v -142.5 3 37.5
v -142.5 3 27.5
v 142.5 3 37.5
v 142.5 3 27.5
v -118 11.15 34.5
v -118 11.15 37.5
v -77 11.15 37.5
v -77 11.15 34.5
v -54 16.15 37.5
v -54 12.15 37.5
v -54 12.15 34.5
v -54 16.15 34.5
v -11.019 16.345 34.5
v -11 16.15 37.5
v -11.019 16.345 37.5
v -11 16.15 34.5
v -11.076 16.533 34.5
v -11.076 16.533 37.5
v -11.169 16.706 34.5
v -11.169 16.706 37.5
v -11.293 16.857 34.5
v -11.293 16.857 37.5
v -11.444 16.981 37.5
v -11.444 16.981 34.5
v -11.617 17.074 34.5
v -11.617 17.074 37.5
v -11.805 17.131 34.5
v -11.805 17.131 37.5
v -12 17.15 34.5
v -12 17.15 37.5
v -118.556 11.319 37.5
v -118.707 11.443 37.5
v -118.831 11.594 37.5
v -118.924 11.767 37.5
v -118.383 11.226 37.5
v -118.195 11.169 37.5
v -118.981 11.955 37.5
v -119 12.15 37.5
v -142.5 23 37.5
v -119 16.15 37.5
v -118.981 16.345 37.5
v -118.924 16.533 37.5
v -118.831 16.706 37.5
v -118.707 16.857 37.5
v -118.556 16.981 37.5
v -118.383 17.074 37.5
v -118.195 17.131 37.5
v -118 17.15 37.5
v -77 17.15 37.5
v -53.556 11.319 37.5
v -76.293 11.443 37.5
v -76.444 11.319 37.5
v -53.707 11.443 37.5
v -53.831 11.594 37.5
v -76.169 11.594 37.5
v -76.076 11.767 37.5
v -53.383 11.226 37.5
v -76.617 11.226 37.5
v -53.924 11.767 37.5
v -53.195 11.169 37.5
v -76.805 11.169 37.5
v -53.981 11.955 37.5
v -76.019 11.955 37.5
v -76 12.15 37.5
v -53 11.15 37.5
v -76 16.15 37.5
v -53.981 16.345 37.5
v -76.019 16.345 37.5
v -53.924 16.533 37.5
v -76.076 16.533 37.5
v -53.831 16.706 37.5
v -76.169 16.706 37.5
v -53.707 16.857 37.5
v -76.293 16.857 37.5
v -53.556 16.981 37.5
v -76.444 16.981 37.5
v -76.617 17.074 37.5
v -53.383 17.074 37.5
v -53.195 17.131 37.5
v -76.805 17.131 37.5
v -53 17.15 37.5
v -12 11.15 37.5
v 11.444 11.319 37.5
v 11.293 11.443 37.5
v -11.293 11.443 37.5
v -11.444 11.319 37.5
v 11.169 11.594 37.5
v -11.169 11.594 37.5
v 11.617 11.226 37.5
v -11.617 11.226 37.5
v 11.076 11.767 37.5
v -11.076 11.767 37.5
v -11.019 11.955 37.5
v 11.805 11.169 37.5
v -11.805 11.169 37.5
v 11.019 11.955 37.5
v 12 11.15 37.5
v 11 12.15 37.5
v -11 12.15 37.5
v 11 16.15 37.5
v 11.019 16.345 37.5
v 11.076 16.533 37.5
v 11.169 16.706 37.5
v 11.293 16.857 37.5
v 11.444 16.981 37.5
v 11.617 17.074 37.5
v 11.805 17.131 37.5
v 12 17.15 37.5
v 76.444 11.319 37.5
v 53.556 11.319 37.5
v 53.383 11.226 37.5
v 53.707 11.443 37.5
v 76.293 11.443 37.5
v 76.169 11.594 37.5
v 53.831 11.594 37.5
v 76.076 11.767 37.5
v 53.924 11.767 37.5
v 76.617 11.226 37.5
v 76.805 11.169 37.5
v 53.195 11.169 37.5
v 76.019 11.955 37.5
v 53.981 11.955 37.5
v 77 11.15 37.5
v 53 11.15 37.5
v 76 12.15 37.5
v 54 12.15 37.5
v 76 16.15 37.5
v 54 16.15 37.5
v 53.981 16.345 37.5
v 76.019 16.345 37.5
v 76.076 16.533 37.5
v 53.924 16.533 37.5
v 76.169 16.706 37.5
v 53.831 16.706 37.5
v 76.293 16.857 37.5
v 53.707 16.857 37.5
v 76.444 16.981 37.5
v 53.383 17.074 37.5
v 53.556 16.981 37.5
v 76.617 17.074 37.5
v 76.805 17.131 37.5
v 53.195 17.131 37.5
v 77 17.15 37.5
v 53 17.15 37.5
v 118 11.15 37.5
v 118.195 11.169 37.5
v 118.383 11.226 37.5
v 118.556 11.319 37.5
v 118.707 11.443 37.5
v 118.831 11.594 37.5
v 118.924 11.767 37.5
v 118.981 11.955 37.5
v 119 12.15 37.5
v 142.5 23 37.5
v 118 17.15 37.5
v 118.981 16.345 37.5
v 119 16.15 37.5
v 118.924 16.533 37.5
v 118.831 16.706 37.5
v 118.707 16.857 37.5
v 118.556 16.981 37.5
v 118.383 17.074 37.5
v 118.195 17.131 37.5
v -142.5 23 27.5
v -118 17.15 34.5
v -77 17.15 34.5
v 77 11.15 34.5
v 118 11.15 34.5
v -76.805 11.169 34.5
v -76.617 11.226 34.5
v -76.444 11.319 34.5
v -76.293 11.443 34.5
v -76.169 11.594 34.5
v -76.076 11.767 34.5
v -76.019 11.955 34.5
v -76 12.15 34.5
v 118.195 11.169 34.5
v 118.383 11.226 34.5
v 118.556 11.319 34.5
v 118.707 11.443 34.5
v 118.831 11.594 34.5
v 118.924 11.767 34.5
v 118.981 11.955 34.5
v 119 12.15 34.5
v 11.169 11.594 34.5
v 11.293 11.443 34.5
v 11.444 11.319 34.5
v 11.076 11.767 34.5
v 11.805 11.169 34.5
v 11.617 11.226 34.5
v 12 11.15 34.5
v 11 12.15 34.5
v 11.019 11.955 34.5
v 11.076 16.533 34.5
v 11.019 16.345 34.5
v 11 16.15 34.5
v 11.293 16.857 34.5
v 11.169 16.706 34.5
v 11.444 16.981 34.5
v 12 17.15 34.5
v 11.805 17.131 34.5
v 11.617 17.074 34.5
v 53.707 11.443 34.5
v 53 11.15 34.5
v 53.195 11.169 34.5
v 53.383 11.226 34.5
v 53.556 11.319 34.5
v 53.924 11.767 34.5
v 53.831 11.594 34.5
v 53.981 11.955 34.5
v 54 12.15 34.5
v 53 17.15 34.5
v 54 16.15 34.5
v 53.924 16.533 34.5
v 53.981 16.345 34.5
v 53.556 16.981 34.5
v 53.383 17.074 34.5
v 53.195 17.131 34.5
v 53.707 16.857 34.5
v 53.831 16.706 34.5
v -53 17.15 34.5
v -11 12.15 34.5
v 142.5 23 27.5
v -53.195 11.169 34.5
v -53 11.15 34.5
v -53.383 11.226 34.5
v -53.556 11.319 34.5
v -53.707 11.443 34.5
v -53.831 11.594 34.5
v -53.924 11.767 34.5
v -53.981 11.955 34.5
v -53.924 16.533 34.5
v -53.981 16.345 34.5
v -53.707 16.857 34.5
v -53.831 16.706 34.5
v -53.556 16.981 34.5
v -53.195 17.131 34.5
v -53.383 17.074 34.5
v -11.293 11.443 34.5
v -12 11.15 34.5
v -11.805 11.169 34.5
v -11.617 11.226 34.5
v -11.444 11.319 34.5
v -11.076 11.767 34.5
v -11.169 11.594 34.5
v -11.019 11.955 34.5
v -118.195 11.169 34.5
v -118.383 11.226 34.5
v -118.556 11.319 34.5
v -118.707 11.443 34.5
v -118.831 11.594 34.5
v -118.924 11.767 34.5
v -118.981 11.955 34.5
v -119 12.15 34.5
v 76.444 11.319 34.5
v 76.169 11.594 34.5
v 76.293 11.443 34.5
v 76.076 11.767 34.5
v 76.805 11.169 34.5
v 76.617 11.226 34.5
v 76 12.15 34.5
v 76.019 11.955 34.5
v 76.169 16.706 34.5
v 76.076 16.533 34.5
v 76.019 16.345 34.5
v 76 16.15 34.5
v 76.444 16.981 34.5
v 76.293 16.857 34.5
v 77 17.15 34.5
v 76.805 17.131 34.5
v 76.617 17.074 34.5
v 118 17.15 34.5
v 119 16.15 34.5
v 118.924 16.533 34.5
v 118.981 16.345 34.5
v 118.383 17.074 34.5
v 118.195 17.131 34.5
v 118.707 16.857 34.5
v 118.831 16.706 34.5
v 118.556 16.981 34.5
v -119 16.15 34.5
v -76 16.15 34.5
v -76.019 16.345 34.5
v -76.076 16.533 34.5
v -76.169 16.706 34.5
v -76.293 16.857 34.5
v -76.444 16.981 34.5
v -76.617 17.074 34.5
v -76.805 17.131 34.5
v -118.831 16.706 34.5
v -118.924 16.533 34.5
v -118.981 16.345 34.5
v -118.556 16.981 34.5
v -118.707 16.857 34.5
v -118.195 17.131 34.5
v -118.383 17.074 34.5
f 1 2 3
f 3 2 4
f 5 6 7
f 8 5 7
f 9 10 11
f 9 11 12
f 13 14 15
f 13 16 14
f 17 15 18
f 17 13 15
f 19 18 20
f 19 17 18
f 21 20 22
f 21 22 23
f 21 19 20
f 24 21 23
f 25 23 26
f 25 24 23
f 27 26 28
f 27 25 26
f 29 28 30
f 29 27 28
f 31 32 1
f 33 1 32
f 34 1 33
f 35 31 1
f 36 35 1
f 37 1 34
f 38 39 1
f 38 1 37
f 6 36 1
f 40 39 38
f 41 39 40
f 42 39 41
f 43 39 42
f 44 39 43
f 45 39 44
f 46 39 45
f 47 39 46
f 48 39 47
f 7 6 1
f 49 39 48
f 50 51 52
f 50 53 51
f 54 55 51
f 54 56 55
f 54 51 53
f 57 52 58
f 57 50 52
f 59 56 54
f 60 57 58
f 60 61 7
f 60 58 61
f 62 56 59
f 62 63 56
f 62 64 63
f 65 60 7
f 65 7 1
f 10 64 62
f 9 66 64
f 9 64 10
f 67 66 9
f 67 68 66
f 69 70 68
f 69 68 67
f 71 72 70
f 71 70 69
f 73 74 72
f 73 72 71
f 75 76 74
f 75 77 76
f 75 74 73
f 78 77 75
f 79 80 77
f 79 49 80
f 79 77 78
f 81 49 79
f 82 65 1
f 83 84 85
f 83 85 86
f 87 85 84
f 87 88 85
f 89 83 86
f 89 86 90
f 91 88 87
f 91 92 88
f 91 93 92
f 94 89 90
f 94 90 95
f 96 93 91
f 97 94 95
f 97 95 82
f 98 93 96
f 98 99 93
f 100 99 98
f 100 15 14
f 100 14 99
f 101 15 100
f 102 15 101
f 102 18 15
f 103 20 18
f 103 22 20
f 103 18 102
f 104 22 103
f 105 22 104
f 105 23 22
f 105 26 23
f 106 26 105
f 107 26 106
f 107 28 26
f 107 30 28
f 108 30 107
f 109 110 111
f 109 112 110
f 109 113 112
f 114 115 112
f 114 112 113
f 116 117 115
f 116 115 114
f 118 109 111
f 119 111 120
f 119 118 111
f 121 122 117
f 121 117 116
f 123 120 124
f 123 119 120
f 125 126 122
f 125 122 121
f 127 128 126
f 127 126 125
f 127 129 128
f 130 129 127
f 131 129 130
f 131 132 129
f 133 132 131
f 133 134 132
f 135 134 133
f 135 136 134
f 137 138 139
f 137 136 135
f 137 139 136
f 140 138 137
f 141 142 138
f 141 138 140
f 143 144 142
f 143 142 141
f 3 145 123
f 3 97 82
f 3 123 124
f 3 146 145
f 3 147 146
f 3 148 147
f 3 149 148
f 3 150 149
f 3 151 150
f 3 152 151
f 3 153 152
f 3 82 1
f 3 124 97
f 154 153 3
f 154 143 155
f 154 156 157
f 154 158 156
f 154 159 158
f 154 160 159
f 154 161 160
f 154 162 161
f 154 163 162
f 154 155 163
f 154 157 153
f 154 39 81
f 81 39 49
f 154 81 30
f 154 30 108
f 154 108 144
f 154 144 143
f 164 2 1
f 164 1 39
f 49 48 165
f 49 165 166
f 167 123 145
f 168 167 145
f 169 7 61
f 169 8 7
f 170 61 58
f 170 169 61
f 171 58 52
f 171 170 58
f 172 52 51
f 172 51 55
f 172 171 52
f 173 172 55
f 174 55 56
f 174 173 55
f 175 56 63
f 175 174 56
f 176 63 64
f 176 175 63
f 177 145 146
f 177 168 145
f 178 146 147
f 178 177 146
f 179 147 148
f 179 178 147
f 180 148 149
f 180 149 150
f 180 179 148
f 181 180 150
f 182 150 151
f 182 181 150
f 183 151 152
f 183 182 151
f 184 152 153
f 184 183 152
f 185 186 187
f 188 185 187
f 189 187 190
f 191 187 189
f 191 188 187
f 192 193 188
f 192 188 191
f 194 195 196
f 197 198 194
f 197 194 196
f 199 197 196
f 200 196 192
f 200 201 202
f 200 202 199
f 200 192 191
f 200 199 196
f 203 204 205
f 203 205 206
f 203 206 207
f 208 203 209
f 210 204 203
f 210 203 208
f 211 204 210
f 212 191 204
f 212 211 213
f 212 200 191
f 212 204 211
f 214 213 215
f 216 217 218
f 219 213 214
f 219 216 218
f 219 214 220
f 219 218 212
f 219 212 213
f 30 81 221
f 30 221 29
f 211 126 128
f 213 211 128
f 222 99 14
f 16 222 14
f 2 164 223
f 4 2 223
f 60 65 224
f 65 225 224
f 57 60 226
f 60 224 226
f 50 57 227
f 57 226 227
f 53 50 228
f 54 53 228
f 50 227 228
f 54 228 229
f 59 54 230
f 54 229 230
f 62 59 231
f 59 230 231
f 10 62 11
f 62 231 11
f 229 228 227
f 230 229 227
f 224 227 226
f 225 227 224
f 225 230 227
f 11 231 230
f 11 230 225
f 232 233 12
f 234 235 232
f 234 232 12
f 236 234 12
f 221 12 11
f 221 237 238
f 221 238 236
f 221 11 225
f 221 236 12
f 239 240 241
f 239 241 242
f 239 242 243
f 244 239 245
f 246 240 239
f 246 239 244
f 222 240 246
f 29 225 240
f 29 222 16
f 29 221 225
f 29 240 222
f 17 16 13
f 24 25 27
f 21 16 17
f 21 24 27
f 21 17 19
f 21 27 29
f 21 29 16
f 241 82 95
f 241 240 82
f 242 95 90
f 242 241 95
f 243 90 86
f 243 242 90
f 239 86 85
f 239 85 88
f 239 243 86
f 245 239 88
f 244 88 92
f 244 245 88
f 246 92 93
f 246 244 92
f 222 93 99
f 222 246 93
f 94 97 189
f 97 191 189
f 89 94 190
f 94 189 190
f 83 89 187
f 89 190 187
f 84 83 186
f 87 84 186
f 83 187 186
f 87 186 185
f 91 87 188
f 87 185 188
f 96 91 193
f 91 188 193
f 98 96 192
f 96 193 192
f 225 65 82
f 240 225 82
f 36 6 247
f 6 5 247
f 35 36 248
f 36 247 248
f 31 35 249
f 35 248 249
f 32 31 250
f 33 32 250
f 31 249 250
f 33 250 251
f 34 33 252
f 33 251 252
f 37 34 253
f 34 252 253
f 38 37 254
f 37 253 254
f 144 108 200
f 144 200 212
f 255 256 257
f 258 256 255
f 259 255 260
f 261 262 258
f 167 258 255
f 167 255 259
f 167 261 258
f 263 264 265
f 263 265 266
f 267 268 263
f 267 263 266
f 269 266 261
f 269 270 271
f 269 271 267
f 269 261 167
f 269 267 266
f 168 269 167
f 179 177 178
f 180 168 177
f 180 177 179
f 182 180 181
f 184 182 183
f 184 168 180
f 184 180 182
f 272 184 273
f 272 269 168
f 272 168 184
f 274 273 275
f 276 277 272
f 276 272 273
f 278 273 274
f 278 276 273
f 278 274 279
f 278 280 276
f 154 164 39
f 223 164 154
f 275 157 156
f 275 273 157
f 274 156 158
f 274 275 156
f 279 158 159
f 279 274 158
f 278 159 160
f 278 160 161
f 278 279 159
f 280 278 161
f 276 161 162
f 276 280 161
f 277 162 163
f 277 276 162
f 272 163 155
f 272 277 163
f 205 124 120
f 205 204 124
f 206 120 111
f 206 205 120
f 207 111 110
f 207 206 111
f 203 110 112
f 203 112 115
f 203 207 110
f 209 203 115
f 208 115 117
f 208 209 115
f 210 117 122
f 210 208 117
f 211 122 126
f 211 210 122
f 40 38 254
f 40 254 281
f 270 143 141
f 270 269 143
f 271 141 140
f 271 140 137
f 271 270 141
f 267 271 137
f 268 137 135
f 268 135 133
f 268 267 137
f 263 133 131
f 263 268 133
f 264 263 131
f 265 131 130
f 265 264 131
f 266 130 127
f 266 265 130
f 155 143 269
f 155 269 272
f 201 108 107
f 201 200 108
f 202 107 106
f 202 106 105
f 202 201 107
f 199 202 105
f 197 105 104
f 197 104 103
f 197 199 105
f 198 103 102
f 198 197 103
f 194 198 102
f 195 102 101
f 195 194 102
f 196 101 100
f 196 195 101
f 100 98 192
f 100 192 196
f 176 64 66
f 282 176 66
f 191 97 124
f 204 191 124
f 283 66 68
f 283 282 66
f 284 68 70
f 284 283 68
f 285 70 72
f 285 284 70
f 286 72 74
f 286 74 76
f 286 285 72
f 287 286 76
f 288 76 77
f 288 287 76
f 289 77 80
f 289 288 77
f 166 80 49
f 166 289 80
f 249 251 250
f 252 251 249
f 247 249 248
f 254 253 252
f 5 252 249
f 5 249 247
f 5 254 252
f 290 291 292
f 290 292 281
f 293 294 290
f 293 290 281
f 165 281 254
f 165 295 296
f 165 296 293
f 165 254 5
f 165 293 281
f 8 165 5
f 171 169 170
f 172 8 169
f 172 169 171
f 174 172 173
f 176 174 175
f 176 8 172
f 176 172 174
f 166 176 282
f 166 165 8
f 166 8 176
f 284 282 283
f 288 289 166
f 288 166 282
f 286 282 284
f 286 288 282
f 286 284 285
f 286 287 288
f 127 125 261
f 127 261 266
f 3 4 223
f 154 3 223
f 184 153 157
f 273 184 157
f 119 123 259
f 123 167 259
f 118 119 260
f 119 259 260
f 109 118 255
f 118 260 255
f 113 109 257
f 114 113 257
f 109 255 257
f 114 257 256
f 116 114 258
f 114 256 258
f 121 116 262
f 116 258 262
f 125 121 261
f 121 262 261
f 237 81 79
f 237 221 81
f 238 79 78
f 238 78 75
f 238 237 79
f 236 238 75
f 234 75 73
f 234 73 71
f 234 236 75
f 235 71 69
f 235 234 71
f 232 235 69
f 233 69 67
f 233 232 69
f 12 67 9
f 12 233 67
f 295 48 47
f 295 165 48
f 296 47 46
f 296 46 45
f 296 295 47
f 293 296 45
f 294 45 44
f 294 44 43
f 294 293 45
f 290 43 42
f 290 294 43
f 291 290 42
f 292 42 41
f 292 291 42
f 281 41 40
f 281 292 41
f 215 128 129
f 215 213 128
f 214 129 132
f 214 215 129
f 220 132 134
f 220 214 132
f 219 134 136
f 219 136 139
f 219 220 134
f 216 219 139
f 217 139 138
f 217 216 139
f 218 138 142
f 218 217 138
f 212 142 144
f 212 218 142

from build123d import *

# Parameters (mm, degrees)
SKETCH1_W           = 285
SKETCH1_H           = 20
BOSS_EXTRUDE1_DEPTH = 10
SKETCH5_W           = 43
SKETCH5_H           = 6
CUT_EXTRUDE1_DEPTH  = 3
FILLET1_R           = 1


with BuildPart() as part:
    # Sketch1 → Boss-Extrude1 (new body)
    with BuildSketch(Plane.XY.offset(27.5)):
        with Locations((0, 13)):
            Rectangle(SKETCH1_W, SKETCH1_H)
    extrude(amount=BOSS_EXTRUDE1_DEPTH)

    # Sketch5 → Cut-Extrude1 (cut)
    with BuildSketch(Plane.XY.offset(37.5)):
        with Locations((-97.5, 14.15)):
            Rectangle(SKETCH5_W, SKETCH5_H)
        with Locations((-32.5, 14.15)):
            Rectangle(SKETCH5_W, SKETCH5_H)
        with Locations((32.5, 14.15)):
            Rectangle(SKETCH5_W, SKETCH5_H)
        with Locations((97.5, 14.15)):
            Rectangle(SKETCH5_W, SKETCH5_H)
    extrude(amount=-CUT_EXTRUDE1_DEPTH, mode=Mode.SUBTRACT)

    # Fillet1
    fillet1_edges = [part.edges().sort_by_distance(p)[0] for p in [
        (-76, 17.15, 36),
        (-76, 11.15, 36),
        (-119, 11.15, 36),
        (-119, 17.15, 36),
        (-11, 17.15, 36),
        (-11, 11.15, 36),
        (-54, 11.15, 36),
        (-54, 17.15, 36),
        (54, 17.15, 36),
        (54, 11.15, 36),
        (11, 11.15, 36),
        (11, 17.15, 36),
        (119, 17.15, 36),
        (119, 11.15, 36),
        (76, 11.15, 36),
        (76, 17.15, 36),
    ]]
    fillet(fillet1_edges, radius=FILLET1_R)


solid = part.part
